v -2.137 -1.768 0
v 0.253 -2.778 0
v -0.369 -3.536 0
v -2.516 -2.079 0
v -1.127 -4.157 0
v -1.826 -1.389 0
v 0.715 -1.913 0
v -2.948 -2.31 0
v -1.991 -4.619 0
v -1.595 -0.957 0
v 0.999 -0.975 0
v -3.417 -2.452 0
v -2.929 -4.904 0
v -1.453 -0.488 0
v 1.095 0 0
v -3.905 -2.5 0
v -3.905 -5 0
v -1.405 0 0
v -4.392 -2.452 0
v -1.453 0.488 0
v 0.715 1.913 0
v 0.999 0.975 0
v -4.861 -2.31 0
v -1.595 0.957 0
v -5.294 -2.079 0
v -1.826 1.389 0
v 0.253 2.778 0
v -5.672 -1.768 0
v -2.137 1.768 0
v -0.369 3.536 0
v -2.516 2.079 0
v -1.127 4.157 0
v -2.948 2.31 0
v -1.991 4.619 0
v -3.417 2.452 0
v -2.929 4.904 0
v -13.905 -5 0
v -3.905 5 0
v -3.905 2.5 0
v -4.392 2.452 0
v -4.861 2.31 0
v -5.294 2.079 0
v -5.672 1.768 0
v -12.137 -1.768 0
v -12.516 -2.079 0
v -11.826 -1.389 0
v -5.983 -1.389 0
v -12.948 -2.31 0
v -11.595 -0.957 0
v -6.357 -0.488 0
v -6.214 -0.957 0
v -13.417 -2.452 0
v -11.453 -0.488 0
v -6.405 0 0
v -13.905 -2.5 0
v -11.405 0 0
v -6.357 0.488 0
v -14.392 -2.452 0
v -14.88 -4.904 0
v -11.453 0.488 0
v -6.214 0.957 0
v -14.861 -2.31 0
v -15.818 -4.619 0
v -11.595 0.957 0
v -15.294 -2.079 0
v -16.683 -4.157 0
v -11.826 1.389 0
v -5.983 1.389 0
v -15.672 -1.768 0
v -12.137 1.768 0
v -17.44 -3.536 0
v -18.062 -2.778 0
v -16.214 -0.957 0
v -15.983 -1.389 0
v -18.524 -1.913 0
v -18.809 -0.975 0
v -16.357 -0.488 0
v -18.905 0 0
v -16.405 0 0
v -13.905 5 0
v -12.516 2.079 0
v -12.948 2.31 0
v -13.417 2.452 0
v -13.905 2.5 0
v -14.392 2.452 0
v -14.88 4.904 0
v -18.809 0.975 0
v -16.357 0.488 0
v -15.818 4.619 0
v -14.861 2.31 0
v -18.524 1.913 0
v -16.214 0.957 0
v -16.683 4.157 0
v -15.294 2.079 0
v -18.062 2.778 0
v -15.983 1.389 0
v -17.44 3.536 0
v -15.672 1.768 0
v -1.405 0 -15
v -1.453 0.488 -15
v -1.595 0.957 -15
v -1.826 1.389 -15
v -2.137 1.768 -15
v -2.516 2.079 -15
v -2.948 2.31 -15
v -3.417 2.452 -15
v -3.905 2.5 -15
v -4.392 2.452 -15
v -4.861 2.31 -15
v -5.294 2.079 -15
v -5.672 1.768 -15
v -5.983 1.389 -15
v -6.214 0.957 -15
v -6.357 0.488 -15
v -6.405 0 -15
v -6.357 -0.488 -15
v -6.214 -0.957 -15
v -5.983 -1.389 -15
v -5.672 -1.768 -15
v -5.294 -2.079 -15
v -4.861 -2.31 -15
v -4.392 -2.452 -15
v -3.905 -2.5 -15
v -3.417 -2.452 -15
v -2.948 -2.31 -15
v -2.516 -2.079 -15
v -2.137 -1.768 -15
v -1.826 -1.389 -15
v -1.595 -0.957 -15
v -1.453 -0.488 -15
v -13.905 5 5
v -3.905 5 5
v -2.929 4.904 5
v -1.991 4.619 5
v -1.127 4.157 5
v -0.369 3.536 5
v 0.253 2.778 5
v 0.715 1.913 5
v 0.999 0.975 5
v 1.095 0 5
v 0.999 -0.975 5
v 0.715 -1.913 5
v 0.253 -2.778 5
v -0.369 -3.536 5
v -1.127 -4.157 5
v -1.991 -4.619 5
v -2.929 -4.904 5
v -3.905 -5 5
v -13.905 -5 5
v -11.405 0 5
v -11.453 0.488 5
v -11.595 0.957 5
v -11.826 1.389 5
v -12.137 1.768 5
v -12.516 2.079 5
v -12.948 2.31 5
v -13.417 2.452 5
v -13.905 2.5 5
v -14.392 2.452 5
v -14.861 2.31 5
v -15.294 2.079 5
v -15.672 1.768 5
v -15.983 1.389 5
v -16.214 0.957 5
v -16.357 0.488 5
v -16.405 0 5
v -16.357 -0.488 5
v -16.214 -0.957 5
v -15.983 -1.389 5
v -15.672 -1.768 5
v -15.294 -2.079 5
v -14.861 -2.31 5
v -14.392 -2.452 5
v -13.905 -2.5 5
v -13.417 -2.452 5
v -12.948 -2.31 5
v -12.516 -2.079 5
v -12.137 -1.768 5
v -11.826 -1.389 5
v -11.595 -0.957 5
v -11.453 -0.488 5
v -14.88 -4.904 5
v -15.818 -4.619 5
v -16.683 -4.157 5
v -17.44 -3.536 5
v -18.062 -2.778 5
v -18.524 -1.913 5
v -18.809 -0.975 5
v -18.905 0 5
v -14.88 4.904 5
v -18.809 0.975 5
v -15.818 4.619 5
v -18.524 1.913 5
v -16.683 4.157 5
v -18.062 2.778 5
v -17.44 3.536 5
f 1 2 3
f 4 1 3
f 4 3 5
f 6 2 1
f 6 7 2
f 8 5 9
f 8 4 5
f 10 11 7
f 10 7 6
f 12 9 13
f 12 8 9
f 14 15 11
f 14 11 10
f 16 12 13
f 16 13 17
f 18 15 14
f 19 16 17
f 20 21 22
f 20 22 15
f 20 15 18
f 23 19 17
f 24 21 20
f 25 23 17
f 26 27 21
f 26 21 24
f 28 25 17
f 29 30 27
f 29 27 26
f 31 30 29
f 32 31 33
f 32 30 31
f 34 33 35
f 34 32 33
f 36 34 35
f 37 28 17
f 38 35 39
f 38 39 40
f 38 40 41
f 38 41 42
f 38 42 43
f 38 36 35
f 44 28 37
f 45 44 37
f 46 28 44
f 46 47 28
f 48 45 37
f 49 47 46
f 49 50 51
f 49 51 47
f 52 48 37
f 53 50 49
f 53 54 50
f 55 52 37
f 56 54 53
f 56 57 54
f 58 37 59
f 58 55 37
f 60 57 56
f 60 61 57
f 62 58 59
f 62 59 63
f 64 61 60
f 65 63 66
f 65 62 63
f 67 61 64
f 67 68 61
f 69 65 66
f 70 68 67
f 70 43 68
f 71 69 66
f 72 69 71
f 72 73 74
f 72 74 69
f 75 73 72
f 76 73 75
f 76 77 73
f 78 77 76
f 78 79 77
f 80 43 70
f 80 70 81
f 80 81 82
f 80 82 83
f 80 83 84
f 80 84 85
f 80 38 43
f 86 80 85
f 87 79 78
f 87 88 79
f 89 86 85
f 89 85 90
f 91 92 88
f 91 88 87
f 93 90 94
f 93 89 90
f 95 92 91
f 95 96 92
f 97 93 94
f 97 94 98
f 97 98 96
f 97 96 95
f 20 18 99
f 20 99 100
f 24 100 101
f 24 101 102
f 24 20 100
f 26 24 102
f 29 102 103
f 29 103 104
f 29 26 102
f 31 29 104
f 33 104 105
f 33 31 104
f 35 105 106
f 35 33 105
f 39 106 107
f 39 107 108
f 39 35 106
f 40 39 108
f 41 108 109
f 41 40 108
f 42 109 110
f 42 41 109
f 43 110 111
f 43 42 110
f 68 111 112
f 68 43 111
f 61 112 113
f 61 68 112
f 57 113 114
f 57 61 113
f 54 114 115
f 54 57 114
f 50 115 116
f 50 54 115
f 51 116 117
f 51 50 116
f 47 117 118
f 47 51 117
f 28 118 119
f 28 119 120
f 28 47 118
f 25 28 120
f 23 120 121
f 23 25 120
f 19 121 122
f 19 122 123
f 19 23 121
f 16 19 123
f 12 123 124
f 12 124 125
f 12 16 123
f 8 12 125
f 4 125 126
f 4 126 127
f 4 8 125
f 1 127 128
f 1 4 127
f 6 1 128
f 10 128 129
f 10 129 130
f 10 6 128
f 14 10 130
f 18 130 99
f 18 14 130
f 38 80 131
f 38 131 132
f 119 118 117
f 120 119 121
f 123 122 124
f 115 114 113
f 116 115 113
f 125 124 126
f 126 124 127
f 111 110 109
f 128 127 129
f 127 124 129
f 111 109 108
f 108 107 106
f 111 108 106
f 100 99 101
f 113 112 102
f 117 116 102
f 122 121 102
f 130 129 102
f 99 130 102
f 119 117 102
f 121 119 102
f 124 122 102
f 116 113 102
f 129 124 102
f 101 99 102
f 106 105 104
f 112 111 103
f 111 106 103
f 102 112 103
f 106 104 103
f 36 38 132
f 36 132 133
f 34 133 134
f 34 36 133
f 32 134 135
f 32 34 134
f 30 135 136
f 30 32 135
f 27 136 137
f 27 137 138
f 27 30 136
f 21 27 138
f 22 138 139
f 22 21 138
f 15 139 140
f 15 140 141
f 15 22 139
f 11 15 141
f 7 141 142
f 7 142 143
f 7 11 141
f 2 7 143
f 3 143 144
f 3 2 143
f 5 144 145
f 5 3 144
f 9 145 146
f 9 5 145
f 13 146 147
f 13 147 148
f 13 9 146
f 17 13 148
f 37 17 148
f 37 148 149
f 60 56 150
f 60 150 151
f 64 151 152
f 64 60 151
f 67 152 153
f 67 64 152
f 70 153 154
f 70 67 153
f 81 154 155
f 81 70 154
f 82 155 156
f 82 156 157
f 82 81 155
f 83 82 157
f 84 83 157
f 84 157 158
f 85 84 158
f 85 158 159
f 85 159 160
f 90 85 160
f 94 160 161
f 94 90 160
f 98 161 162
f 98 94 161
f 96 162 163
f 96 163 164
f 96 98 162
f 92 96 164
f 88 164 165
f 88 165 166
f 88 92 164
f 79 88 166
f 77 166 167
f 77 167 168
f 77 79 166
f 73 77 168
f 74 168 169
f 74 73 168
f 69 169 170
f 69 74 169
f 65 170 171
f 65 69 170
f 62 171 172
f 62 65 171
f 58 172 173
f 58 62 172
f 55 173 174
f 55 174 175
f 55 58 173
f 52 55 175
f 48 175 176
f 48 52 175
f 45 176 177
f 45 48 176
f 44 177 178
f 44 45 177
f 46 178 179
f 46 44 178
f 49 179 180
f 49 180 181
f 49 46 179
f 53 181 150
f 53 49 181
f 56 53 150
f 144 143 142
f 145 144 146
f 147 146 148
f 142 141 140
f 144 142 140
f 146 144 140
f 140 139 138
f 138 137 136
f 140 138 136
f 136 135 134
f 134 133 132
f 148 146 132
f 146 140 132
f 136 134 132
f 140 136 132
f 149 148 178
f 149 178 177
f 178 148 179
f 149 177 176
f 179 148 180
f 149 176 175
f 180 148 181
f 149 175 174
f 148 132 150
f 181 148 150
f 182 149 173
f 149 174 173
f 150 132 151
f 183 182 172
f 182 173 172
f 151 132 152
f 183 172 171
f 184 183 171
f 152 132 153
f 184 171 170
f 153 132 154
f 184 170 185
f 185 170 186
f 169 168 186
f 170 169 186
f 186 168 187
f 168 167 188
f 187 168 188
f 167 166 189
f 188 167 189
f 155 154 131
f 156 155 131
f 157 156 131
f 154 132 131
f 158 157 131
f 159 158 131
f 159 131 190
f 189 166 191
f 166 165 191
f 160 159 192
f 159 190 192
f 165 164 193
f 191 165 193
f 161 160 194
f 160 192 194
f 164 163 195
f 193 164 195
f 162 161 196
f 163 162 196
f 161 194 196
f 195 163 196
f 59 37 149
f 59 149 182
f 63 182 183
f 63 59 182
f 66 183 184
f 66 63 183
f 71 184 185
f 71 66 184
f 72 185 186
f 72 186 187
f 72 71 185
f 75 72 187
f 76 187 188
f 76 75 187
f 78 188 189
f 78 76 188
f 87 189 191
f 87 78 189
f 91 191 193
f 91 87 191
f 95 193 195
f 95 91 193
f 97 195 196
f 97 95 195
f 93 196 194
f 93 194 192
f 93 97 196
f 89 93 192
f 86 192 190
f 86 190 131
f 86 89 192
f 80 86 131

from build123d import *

# Parameters (mm, degrees)
SKETCH1_R           = 2.5
BOSS_EXTRUDE1_DEPTH = 5
SKETCH1_3_R         = 2.5
BOSS_EXTRUDE2_DEPTH = 15


with BuildPart() as part:
    # Sketch1 → Boss-Extrude1 (new body)
    with BuildSketch(Plane.XY):
        with BuildLine():
            Line((-13.904710079, 5), (-3.904710079, 5))
            ThreePointArc((-3.904710079, 5), (1.095289921, 0), (-3.904710079, -5))
            Line((-3.904710079, -5), (-13.904710079, -5))
            ThreePointArc((-13.904710079, -5), (-18.904710079, 0), (-13.904710079, 5))
        make_face()
        with Locations((-13.904710079, 0)):
            Circle(SKETCH1_R, mode=Mode.SUBTRACT)
    extrude(amount=BOSS_EXTRUDE1_DEPTH)

    # Sketch1<3> → Boss-Extrude2 (add)
    with BuildSketch(Plane.XY):
        with Locations((-3.904710079, 0)):
            Circle(SKETCH1_3_R)
    extrude(amount=-BOSS_EXTRUDE2_DEPTH)


solid = part.part
